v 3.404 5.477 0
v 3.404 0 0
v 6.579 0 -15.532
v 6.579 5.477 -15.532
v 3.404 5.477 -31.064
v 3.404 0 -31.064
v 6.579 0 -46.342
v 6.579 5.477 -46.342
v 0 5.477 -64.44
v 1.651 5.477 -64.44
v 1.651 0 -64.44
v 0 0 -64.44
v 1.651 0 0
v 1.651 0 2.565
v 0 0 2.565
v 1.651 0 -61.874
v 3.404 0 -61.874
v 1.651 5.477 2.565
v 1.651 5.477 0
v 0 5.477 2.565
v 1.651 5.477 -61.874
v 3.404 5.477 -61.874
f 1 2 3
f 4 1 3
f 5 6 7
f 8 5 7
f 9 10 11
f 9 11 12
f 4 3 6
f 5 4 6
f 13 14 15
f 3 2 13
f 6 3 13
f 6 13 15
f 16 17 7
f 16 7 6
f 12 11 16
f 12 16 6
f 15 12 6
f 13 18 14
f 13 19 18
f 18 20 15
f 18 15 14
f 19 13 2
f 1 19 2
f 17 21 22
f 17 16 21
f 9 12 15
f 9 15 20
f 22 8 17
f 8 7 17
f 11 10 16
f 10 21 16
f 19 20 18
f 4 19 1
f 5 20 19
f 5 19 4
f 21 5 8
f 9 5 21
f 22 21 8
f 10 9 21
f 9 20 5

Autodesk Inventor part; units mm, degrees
ref_plane "YZ Plane" through (0, 0, 0) normal (1, 0, 0) x (0, 1, 0)
ref_plane "XZ Plane" through (0, 0, 0) normal (0, 1, 0) x (-1, 0, 0)
ref_plane "XY Plane" through (0, 0, 0) normal (0, 0, 1) x (1, 0, 0)
sketch "Sketch1" plane through (0, 0, 0) normal (0, 1, 0) x (-1, 0, 0)
  line L0 (0, 0) -> (0, -61.8744)
  line L1 (0, 0) -> (-3.4036, 0)
  line L2 (0, -61.8744) -> (-3.4036, -61.8744)
  line L3 (-3.4036, 0) -> (-6.5786, -15.5321)
  line L4 (-6.5786, -15.5321) -> (-3.4036, -31.0642)
  line L5 (-3.4036, -31.0642) -> (-6.5786, -46.3423)
  line L6 (-6.5786, -46.3423) -> (-3.4036, -61.8744)
  dimension "d0" = 61.8744
  dimension "d1" = 3.4036
  dimension "d2" = 3.4036
  dimension "d3" = 15.5321
  dimension "d4" = 31.0642
  dimension "d5" = 15.5321
  dimension "d6" = 3.175
  dimension "d7" = 3.175
extrude "Extrusion1" add sketch "Sketch1" along normal blind 5.4769
sketch "Sketch2" plane through (0, 0, 0) normal (0, 0, 1) x (1, 0, 0)
  line L0 (3.4036, 0) -> (0, 0) projected
  line L1 (0, 5.4769) -> (1.651, 5.4769)
  line L2 (1.651, 5.4769) -> (1.651, 0)
  line L3 (1.651, 0) -> (0, 0)
  line L4 (0, 0) -> (0, 5.4769)
  dimension "d10" = 1.651
sketch "Sketch3" plane through (3.4036, 0, -61.8744) normal (0, 0, -1) x (-1, 0, 0)
  line L0 (0, 0) -> (3.4036, 0) projected
  line L1 (3.4036, 5.4769) -> (1.7526, 5.4769)
  line L2 (1.7526, 5.4769) -> (1.7526, 0)
  line L3 (1.7526, 0) -> (3.4036, 0)
  line L4 (3.4036, 0) -> (3.4036, 5.4769)
  dimension "d11" = 1.651
extrude "Extrusion2" add sketch "Sketch3" along normal blind 2.5654
extrude "Extrusion3" add sketch "Sketch2" along normal blind 2.5654
properties part number "Short_insert_CPY1_CPY"
